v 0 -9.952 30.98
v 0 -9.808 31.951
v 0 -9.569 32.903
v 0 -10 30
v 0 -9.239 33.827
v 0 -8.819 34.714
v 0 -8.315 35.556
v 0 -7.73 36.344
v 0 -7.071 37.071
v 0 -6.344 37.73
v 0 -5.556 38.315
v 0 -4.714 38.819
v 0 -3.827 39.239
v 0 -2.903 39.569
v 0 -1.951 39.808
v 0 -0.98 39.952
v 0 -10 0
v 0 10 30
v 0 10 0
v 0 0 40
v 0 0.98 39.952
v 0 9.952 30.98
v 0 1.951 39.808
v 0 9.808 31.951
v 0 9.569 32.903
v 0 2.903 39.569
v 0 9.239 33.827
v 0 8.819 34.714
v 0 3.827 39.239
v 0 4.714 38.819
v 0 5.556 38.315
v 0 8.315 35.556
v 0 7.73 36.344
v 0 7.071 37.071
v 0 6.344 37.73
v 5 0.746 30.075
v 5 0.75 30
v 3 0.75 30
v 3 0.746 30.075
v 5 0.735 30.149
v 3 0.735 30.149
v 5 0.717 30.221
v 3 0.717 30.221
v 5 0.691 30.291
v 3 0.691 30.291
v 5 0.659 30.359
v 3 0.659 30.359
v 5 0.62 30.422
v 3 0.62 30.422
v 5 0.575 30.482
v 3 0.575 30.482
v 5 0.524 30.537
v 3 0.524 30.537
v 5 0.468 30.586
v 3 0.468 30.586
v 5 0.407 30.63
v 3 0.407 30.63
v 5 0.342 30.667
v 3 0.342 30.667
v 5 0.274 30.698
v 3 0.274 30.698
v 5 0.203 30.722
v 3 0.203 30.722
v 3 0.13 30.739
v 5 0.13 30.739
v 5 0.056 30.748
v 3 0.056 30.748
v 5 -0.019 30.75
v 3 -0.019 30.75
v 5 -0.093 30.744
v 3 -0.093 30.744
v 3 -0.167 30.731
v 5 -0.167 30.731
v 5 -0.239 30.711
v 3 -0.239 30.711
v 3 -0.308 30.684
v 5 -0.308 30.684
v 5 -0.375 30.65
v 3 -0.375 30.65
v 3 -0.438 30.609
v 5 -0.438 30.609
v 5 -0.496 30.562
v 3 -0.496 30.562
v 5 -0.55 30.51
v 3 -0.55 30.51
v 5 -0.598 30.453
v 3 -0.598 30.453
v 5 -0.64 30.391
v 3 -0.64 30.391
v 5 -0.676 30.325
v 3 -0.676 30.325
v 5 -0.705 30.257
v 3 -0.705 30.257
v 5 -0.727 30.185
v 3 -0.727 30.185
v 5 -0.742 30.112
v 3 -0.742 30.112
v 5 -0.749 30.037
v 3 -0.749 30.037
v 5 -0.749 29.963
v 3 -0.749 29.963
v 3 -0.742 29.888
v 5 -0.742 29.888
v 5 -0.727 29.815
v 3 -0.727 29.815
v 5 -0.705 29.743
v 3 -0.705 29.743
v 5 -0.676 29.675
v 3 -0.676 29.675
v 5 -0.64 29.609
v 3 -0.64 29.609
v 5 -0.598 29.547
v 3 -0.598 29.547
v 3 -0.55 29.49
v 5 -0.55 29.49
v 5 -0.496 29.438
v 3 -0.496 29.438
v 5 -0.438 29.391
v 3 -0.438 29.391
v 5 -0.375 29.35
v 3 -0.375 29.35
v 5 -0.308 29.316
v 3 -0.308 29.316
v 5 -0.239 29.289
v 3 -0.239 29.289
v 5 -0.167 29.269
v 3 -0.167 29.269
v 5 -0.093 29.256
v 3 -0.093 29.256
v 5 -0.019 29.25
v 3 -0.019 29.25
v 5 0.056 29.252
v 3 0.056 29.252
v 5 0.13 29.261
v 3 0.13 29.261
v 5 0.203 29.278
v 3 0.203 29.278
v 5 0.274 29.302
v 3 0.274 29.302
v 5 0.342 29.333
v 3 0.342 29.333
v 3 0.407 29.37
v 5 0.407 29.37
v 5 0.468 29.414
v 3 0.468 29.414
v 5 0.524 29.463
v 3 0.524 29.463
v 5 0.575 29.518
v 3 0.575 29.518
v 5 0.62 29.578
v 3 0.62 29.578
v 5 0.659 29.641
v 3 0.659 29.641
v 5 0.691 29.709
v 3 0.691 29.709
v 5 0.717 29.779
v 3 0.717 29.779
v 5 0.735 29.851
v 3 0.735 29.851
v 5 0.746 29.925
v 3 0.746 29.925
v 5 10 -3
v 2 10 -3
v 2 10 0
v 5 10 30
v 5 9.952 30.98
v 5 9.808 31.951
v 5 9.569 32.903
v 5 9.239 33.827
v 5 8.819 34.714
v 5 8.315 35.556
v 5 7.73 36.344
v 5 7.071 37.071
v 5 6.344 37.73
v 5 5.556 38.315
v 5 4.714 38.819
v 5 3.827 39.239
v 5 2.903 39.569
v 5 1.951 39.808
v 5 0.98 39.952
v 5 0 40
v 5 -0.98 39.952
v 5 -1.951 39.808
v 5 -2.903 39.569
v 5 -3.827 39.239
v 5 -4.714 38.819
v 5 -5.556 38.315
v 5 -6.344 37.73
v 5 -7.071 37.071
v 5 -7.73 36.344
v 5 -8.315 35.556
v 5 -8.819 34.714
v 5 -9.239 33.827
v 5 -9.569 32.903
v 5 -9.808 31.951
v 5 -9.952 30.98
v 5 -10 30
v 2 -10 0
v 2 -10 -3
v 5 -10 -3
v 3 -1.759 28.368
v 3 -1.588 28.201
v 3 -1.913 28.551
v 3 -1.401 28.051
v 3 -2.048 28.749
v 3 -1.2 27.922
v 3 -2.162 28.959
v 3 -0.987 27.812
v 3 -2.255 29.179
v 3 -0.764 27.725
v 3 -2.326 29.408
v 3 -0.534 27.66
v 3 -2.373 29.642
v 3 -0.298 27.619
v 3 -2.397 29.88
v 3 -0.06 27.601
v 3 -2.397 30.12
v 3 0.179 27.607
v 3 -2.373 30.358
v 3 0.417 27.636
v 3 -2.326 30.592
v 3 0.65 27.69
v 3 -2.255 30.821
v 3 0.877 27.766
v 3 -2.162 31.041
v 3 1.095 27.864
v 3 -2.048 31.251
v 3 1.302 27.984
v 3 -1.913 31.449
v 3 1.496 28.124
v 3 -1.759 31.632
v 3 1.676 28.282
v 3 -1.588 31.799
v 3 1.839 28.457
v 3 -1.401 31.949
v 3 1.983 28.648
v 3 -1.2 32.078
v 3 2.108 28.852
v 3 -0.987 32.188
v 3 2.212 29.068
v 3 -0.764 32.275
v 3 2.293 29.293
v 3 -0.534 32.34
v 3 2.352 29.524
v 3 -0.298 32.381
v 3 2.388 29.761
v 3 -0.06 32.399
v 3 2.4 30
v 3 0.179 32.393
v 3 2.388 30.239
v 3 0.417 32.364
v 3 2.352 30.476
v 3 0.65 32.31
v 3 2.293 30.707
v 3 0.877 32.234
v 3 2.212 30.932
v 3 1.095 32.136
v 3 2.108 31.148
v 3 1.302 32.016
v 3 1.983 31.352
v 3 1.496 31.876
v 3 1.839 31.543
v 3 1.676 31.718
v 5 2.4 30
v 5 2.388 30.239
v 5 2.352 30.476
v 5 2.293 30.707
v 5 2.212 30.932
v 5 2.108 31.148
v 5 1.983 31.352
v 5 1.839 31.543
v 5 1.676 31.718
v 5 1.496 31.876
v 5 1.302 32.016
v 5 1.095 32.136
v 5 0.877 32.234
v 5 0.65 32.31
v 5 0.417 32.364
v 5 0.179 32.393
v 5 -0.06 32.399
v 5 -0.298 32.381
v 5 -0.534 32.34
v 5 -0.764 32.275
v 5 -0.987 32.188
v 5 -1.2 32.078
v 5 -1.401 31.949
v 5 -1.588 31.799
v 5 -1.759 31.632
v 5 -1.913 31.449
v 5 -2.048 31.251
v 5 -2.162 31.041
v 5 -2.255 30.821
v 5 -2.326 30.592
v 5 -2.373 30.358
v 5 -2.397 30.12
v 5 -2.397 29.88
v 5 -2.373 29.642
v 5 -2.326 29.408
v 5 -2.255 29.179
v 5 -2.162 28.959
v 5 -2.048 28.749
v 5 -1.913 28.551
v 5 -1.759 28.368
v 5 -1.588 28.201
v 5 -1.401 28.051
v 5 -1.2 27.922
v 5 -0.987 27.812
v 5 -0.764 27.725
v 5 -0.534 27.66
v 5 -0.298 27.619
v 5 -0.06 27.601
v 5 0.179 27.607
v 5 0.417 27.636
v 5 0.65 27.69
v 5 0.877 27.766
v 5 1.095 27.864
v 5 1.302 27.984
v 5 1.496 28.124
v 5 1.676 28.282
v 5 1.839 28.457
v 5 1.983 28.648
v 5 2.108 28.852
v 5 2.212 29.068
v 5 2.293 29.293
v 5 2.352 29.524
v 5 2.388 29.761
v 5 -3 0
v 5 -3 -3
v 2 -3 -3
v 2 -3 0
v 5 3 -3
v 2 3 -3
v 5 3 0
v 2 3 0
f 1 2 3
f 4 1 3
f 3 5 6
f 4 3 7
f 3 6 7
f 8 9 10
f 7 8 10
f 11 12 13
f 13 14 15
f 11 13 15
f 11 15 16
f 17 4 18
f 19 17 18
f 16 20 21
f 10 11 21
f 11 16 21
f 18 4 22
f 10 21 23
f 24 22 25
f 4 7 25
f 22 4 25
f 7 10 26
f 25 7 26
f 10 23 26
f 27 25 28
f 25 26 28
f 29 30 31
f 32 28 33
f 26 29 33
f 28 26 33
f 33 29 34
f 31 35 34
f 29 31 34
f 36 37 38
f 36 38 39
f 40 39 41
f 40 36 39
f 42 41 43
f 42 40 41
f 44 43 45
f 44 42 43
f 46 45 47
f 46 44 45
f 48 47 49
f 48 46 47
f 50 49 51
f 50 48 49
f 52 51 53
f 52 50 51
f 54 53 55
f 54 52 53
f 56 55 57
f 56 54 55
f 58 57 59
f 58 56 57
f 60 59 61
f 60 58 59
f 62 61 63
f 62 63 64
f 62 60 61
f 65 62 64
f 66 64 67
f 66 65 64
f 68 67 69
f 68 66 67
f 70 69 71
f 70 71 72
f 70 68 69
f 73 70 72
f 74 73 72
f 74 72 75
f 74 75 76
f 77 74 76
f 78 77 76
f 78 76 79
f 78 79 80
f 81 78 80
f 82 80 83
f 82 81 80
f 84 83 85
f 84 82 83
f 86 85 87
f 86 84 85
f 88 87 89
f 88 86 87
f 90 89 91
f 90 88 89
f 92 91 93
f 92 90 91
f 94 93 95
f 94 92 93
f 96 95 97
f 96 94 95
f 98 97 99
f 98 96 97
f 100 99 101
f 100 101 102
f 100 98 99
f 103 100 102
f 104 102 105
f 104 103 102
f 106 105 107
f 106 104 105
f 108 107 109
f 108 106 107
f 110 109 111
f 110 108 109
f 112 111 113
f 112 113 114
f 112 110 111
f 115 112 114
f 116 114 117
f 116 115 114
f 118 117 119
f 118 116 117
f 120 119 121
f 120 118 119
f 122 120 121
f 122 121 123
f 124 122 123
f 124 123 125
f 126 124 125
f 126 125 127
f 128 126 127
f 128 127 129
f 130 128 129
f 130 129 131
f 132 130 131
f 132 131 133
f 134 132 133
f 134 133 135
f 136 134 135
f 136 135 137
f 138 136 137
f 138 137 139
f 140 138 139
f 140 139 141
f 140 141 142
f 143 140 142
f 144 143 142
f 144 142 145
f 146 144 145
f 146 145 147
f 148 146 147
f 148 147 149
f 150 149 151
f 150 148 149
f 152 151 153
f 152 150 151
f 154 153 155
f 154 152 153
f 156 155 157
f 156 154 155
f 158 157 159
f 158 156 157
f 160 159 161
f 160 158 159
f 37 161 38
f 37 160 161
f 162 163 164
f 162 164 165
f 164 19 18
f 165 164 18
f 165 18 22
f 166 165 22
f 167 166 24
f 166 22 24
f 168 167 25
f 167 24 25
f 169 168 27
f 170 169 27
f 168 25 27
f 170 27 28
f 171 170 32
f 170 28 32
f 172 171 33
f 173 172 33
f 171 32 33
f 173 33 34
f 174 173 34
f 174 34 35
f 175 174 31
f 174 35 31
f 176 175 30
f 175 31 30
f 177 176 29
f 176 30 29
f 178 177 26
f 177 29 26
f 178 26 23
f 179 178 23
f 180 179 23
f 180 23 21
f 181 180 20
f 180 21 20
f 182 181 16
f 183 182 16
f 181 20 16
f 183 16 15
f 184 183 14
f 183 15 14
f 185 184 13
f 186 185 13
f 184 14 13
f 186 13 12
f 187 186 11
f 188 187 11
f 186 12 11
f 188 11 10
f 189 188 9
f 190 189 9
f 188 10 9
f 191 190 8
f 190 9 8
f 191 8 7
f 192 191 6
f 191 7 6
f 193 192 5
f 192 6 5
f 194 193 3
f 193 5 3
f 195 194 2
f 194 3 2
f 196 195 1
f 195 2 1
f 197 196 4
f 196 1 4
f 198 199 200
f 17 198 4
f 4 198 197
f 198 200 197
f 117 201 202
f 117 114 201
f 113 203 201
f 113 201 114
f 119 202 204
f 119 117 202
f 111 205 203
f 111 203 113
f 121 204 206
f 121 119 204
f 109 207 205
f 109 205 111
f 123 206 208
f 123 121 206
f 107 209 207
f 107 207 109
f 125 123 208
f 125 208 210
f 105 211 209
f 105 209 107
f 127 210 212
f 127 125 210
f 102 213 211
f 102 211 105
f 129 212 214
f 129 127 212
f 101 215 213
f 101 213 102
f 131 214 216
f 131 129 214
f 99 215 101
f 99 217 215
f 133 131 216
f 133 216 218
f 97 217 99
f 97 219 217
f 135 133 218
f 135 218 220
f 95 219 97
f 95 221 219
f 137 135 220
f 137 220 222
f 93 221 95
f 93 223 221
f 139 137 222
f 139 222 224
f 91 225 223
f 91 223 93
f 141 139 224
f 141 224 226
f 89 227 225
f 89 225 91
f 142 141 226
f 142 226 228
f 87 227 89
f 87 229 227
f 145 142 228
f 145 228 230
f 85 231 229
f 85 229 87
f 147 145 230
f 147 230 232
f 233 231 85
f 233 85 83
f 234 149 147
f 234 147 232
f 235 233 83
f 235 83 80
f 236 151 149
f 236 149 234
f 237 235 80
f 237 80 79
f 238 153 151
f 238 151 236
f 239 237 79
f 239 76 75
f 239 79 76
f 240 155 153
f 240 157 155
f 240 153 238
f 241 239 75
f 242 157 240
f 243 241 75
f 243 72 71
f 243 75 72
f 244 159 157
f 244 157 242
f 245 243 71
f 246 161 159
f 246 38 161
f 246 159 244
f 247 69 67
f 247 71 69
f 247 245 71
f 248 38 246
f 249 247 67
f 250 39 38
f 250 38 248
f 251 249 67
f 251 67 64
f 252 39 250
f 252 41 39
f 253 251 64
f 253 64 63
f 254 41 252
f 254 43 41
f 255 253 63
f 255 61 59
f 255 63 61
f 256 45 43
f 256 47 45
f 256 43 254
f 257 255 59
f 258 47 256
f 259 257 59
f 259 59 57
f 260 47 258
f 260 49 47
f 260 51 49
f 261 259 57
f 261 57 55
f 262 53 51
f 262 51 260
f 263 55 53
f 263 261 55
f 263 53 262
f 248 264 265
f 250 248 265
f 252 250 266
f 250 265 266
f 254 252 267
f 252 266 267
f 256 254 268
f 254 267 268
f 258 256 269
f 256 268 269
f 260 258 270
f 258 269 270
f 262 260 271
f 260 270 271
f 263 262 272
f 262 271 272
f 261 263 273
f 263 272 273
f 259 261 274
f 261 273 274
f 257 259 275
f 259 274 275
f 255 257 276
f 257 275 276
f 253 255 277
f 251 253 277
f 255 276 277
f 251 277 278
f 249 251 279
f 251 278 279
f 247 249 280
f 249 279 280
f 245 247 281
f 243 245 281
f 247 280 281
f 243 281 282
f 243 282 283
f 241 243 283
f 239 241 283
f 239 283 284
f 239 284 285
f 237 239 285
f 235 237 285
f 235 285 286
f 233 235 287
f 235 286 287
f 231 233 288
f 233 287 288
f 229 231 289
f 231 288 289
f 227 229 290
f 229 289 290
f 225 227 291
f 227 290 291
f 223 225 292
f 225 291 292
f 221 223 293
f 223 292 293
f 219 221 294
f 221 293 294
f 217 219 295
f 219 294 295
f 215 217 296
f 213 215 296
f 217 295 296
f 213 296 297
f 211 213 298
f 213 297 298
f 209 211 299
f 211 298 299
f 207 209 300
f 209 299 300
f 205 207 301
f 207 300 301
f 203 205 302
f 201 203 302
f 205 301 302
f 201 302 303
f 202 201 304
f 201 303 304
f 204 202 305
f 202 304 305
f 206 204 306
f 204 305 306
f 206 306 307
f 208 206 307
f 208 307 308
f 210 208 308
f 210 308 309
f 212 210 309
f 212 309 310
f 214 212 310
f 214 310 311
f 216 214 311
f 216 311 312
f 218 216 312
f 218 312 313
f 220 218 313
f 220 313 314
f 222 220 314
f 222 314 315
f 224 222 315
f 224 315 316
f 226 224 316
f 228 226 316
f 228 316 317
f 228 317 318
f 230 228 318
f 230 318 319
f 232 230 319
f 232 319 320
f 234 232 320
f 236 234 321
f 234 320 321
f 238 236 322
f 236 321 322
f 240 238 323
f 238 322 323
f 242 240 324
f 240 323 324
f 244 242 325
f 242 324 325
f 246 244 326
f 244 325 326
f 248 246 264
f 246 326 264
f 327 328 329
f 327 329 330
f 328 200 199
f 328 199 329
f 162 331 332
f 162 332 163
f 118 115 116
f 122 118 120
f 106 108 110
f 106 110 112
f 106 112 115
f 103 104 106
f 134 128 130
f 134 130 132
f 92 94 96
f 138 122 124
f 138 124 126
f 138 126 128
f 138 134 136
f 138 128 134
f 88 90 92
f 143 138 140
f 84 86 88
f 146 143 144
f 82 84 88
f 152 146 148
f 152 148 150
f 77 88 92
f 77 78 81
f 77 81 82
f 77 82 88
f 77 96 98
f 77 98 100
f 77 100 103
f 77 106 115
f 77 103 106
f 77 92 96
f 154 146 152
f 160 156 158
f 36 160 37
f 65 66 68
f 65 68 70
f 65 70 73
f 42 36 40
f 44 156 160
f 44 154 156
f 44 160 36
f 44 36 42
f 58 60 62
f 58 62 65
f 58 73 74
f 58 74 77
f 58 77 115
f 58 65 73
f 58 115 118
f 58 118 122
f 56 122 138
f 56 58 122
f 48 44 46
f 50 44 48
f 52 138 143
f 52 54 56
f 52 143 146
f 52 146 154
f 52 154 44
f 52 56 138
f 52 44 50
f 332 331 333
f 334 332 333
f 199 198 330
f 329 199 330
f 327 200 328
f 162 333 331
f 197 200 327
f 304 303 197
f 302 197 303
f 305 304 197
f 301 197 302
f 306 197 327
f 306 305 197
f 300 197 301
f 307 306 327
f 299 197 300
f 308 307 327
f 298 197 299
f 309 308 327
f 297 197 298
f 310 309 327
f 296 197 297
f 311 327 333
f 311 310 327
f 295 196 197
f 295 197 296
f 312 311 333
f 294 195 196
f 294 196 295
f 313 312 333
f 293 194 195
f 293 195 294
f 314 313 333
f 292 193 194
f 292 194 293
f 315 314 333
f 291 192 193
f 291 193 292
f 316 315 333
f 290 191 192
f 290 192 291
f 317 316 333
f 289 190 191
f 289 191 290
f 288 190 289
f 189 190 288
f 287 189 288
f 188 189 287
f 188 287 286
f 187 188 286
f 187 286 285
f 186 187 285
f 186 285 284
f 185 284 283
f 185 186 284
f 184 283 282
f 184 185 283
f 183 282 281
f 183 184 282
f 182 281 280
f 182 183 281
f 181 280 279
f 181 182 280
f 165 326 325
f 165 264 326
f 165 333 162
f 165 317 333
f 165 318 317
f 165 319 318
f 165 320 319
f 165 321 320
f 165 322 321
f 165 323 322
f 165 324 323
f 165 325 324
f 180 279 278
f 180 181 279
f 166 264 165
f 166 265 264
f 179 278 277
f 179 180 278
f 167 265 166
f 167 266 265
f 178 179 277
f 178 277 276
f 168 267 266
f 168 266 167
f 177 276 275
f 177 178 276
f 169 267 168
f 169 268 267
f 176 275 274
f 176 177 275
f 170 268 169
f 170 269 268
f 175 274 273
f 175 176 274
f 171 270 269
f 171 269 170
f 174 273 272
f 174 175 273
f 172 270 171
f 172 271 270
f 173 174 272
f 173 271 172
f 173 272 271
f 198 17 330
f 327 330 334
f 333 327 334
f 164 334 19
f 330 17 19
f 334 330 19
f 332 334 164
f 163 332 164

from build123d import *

# Parameters (mm, degrees)
F1_DEPTH = 5
F2_R     = 2.4
F2_R_2   = 0.75
F3_DEPTH = 2
F4_W     = 7
F4_H     = 3
F5_DEPTH = 3


with BuildPart() as f1:
    # F0 (on Right) → F1 (new body)
    with BuildSketch(Plane.YZ):
        with BuildLine():
            ThreePointArc((10, 30), (0, 40), (-10, 30))
            Line((-10, 30), (-10, 0))
            Line((-10, 0), (10, 0))
            Line((10, 0), (10, 30))
        make_face()
    extrude(amount=F1_DEPTH)

    # F2 (on face) → F3 (cut)
    with BuildSketch(Plane.YZ.offset(5)):
        with Locations((0, 30)):
            Circle(F2_R)
        with Locations((0, 30)):
            Circle(F2_R_2, mode=Mode.SUBTRACT)
    extrude(amount=-F3_DEPTH, mode=Mode.SUBTRACT)

    # F4 (on face) → F5 (join)
    with BuildSketch(Plane.YZ.offset(5)):
        with Locations((-6.5, -1.5)):
            Rectangle(F4_W, F4_H)
        with Locations((6.5, -1.5)):
            Rectangle(F4_W, F4_H)
    extrude(amount=-F5_DEPTH)


solid = f1.part
